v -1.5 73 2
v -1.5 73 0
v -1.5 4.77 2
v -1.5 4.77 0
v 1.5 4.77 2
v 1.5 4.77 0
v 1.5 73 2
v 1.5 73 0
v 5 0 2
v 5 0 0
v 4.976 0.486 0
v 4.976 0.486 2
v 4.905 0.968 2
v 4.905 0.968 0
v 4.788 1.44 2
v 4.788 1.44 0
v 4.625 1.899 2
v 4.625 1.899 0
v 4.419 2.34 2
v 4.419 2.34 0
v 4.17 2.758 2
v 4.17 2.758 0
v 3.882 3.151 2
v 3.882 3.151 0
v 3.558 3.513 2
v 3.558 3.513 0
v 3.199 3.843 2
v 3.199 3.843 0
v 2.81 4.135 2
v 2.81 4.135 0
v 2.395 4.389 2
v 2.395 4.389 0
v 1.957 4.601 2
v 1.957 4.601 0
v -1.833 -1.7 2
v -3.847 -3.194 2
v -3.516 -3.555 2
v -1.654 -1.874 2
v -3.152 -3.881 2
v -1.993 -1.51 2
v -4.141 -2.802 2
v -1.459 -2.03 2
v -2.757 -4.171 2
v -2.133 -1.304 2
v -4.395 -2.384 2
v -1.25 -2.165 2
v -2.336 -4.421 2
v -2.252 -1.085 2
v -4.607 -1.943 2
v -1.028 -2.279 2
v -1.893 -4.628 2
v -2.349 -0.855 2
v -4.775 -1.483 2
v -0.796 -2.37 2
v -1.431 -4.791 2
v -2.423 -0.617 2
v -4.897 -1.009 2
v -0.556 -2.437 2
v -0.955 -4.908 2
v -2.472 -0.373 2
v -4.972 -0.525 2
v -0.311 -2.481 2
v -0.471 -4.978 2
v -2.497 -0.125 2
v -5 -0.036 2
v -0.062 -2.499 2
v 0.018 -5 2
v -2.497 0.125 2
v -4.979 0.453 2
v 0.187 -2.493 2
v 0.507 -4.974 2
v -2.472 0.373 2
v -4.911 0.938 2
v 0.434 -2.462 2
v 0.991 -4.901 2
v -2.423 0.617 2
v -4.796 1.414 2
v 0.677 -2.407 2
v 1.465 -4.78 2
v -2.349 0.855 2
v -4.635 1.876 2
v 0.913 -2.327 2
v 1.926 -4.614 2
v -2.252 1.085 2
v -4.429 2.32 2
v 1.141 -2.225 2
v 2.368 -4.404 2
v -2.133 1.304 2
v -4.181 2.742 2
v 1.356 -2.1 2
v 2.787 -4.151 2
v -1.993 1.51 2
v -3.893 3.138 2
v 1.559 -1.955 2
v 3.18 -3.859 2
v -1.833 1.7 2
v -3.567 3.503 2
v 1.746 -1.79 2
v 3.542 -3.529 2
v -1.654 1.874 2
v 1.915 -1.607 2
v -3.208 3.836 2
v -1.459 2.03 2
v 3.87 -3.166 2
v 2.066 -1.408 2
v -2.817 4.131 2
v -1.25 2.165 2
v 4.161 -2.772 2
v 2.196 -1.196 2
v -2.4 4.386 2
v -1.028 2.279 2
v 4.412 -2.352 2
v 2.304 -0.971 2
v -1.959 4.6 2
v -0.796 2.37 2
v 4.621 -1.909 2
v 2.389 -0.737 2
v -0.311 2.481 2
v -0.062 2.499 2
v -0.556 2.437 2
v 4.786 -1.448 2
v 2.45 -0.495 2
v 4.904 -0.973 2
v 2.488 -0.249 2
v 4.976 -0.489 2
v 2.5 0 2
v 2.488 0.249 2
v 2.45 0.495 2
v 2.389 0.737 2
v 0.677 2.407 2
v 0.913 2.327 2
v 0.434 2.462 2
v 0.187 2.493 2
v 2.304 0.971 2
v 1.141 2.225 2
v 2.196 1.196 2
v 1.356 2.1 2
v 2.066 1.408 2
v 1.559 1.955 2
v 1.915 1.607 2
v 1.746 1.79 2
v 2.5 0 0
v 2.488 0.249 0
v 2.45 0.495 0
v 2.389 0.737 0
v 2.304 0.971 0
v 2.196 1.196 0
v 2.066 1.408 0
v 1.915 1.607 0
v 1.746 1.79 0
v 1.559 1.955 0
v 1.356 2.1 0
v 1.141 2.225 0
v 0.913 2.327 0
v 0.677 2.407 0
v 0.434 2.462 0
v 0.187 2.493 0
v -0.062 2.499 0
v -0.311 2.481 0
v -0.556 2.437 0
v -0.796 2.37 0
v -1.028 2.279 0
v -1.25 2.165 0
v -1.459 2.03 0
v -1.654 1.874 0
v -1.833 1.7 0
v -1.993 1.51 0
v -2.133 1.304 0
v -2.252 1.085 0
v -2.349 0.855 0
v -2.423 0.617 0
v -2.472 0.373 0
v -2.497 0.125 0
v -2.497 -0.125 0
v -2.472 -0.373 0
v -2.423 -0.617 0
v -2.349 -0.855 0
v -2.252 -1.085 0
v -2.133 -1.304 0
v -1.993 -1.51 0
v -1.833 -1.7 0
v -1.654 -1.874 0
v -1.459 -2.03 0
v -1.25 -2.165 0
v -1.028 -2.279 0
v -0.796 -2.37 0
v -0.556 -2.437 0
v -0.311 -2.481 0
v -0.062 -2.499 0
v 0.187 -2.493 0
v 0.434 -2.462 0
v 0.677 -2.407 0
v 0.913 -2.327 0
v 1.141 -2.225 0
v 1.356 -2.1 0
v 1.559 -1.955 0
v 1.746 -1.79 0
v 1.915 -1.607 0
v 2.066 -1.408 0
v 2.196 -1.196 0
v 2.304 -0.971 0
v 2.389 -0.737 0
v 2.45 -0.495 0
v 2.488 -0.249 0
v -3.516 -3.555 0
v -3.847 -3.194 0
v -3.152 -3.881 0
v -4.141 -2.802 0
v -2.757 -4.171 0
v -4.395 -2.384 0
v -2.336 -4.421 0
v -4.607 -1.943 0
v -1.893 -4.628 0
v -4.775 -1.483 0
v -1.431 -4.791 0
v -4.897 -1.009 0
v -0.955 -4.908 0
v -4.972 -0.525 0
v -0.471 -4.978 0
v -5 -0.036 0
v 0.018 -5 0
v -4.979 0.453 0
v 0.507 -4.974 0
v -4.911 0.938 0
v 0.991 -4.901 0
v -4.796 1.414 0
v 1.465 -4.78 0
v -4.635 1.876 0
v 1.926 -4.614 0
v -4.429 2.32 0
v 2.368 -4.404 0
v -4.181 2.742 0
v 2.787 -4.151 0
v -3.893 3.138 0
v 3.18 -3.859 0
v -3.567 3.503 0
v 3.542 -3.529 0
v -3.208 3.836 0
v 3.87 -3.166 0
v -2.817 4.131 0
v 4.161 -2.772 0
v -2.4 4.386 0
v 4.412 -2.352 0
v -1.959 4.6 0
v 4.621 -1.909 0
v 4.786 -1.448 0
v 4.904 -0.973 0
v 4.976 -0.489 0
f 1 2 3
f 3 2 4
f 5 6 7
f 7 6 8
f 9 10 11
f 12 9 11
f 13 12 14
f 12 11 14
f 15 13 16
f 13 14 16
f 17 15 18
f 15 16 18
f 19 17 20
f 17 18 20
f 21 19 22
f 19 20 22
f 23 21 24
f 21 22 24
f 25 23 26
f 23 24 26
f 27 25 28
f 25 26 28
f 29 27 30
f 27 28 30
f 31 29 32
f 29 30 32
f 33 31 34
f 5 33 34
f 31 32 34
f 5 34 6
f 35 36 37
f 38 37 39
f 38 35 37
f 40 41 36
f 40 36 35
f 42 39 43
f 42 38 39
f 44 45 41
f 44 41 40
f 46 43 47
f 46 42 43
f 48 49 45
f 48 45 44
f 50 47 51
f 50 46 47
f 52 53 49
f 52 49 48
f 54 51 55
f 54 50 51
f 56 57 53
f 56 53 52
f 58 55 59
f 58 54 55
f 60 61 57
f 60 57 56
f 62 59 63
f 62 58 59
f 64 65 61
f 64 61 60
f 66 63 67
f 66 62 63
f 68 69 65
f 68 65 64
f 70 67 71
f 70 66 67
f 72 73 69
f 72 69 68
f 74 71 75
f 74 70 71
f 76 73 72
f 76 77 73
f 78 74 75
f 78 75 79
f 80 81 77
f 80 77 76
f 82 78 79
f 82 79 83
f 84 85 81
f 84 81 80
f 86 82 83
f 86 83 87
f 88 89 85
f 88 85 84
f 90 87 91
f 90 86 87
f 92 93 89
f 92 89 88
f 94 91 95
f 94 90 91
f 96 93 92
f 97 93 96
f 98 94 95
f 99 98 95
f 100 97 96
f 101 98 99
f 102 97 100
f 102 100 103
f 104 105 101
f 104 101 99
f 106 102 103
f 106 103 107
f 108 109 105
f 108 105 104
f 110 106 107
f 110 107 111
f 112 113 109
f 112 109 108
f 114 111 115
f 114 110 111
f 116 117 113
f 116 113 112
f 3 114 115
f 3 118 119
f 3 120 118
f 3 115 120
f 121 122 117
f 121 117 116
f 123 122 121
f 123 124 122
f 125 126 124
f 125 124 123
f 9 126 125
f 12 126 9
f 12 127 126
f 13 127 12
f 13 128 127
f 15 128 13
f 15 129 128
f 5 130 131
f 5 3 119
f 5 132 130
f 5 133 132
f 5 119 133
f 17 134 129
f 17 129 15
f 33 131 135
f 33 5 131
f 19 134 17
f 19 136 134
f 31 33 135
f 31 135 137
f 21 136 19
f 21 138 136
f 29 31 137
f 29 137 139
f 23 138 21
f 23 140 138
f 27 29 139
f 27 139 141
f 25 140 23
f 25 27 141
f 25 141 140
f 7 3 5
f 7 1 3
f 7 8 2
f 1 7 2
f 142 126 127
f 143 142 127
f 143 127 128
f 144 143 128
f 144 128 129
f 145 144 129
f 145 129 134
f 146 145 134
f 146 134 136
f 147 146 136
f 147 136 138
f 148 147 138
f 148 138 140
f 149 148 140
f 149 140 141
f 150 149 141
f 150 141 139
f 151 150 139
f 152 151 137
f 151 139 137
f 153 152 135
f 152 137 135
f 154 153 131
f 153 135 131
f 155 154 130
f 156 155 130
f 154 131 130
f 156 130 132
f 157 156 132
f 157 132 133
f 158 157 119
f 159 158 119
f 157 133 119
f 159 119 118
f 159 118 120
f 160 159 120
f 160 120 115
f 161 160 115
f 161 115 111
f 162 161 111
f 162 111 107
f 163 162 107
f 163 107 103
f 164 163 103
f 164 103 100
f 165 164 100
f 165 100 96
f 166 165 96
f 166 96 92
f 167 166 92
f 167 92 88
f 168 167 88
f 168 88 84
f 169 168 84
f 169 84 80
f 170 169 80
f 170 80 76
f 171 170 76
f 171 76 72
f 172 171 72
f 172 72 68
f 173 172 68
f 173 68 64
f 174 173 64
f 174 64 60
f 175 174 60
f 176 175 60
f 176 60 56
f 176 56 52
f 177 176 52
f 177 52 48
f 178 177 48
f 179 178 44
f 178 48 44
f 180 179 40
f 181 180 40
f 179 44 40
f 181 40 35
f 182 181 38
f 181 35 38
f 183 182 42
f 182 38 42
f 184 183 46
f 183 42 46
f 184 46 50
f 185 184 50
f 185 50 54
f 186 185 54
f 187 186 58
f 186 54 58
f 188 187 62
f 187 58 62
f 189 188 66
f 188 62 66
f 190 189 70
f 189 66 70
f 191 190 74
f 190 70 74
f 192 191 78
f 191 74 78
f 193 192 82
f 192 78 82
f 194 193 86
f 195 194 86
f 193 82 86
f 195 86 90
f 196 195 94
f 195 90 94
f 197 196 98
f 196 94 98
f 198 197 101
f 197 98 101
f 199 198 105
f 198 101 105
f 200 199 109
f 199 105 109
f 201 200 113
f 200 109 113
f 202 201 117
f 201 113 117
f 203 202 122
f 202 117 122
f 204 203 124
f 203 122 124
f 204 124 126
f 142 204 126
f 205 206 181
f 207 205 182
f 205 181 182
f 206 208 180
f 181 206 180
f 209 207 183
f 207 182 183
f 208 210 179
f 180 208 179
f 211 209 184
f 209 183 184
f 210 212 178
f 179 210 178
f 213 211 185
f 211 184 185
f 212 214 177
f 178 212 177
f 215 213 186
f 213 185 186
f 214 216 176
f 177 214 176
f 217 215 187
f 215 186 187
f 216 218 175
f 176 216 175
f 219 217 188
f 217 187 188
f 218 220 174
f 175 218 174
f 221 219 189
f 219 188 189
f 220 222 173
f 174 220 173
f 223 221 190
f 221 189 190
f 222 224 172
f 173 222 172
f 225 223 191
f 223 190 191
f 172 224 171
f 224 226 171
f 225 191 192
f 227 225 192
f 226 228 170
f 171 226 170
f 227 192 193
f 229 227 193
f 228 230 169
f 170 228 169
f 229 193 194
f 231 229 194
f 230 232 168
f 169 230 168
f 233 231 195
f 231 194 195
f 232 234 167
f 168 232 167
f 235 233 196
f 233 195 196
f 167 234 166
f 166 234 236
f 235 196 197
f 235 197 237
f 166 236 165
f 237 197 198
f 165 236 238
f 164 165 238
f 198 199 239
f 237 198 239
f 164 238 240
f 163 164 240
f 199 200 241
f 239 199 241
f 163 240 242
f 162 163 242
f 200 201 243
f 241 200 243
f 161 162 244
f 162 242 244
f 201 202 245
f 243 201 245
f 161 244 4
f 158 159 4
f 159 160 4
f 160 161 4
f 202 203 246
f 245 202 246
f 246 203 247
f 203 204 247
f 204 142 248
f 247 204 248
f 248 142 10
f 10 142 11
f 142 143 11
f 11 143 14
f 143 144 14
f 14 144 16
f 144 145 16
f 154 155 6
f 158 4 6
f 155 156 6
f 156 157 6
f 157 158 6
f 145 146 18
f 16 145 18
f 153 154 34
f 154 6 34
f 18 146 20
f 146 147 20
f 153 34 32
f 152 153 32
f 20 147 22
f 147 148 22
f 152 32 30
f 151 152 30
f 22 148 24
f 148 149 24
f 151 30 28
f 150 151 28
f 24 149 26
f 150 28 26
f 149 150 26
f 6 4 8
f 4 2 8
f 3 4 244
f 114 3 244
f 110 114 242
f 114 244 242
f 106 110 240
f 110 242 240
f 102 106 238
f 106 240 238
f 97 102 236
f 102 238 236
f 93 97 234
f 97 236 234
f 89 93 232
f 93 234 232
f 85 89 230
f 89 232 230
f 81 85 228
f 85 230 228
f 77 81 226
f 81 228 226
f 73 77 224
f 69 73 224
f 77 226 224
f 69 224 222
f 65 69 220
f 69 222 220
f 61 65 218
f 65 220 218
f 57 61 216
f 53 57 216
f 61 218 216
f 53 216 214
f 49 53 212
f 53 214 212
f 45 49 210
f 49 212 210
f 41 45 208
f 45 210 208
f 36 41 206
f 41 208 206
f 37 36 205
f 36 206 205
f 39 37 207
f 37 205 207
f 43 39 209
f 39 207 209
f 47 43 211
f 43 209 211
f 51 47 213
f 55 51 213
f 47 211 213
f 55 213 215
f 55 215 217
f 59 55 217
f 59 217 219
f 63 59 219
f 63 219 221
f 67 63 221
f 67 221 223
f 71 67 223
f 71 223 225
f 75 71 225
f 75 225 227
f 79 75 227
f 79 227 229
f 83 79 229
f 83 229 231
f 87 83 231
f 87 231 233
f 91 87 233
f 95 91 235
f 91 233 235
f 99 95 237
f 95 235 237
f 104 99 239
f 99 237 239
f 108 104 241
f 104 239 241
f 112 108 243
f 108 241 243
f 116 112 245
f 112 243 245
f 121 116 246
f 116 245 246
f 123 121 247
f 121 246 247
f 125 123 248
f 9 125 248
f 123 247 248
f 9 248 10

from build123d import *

# Parameters (mm, degrees)
F1_DEPTH = 2
F2_R     = 2.5
F3_DEPTH = 2.001


with BuildPart() as f1:
    # F0 (on Top) → F1 (new body)
    with BuildSketch(Plane.XY):
        with BuildLine():
            ThreePointArc((-1.5, 4.769696), (-2.95804, -4.031129), (5, 0))
            ThreePointArc((5, 0), (4.031129, 2.95804), (1.5, 4.769696))
            Line((1.5, 4.769696), (1.5, 0))
            Line((1.5, 0), (-1.5, 0))
            Line((-1.5, 0), (-1.5, 4.769696))
        make_face()
        with BuildLine():
            Line((1.5, 0), (1.5, 4.769696))
            ThreePointArc((1.5, 4.769696), (0, 5), (-1.5, 4.769696))
            Line((-1.5, 4.769696), (-1.5, 0))
            Line((-1.5, 0), (1.5, 0))
        make_face()
        with BuildLine():
            ThreePointArc((-1.5, 4.769696), (0, 5), (1.5, 4.769696))
            Line((1.5, 4.769696), (1.5, 73))
            Line((1.5, 73), (-1.5, 73))
            Line((-1.5, 73), (-1.5, 4.769696))
        make_face()
    extrude(amount=F1_DEPTH)

    # F2 (on face) → F3 (cut, through all)
    with BuildSketch(Plane.XY.offset(2)):
        Circle(F2_R)
    extrude(amount=-F3_DEPTH, mode=Mode.SUBTRACT)


solid = f1.part
